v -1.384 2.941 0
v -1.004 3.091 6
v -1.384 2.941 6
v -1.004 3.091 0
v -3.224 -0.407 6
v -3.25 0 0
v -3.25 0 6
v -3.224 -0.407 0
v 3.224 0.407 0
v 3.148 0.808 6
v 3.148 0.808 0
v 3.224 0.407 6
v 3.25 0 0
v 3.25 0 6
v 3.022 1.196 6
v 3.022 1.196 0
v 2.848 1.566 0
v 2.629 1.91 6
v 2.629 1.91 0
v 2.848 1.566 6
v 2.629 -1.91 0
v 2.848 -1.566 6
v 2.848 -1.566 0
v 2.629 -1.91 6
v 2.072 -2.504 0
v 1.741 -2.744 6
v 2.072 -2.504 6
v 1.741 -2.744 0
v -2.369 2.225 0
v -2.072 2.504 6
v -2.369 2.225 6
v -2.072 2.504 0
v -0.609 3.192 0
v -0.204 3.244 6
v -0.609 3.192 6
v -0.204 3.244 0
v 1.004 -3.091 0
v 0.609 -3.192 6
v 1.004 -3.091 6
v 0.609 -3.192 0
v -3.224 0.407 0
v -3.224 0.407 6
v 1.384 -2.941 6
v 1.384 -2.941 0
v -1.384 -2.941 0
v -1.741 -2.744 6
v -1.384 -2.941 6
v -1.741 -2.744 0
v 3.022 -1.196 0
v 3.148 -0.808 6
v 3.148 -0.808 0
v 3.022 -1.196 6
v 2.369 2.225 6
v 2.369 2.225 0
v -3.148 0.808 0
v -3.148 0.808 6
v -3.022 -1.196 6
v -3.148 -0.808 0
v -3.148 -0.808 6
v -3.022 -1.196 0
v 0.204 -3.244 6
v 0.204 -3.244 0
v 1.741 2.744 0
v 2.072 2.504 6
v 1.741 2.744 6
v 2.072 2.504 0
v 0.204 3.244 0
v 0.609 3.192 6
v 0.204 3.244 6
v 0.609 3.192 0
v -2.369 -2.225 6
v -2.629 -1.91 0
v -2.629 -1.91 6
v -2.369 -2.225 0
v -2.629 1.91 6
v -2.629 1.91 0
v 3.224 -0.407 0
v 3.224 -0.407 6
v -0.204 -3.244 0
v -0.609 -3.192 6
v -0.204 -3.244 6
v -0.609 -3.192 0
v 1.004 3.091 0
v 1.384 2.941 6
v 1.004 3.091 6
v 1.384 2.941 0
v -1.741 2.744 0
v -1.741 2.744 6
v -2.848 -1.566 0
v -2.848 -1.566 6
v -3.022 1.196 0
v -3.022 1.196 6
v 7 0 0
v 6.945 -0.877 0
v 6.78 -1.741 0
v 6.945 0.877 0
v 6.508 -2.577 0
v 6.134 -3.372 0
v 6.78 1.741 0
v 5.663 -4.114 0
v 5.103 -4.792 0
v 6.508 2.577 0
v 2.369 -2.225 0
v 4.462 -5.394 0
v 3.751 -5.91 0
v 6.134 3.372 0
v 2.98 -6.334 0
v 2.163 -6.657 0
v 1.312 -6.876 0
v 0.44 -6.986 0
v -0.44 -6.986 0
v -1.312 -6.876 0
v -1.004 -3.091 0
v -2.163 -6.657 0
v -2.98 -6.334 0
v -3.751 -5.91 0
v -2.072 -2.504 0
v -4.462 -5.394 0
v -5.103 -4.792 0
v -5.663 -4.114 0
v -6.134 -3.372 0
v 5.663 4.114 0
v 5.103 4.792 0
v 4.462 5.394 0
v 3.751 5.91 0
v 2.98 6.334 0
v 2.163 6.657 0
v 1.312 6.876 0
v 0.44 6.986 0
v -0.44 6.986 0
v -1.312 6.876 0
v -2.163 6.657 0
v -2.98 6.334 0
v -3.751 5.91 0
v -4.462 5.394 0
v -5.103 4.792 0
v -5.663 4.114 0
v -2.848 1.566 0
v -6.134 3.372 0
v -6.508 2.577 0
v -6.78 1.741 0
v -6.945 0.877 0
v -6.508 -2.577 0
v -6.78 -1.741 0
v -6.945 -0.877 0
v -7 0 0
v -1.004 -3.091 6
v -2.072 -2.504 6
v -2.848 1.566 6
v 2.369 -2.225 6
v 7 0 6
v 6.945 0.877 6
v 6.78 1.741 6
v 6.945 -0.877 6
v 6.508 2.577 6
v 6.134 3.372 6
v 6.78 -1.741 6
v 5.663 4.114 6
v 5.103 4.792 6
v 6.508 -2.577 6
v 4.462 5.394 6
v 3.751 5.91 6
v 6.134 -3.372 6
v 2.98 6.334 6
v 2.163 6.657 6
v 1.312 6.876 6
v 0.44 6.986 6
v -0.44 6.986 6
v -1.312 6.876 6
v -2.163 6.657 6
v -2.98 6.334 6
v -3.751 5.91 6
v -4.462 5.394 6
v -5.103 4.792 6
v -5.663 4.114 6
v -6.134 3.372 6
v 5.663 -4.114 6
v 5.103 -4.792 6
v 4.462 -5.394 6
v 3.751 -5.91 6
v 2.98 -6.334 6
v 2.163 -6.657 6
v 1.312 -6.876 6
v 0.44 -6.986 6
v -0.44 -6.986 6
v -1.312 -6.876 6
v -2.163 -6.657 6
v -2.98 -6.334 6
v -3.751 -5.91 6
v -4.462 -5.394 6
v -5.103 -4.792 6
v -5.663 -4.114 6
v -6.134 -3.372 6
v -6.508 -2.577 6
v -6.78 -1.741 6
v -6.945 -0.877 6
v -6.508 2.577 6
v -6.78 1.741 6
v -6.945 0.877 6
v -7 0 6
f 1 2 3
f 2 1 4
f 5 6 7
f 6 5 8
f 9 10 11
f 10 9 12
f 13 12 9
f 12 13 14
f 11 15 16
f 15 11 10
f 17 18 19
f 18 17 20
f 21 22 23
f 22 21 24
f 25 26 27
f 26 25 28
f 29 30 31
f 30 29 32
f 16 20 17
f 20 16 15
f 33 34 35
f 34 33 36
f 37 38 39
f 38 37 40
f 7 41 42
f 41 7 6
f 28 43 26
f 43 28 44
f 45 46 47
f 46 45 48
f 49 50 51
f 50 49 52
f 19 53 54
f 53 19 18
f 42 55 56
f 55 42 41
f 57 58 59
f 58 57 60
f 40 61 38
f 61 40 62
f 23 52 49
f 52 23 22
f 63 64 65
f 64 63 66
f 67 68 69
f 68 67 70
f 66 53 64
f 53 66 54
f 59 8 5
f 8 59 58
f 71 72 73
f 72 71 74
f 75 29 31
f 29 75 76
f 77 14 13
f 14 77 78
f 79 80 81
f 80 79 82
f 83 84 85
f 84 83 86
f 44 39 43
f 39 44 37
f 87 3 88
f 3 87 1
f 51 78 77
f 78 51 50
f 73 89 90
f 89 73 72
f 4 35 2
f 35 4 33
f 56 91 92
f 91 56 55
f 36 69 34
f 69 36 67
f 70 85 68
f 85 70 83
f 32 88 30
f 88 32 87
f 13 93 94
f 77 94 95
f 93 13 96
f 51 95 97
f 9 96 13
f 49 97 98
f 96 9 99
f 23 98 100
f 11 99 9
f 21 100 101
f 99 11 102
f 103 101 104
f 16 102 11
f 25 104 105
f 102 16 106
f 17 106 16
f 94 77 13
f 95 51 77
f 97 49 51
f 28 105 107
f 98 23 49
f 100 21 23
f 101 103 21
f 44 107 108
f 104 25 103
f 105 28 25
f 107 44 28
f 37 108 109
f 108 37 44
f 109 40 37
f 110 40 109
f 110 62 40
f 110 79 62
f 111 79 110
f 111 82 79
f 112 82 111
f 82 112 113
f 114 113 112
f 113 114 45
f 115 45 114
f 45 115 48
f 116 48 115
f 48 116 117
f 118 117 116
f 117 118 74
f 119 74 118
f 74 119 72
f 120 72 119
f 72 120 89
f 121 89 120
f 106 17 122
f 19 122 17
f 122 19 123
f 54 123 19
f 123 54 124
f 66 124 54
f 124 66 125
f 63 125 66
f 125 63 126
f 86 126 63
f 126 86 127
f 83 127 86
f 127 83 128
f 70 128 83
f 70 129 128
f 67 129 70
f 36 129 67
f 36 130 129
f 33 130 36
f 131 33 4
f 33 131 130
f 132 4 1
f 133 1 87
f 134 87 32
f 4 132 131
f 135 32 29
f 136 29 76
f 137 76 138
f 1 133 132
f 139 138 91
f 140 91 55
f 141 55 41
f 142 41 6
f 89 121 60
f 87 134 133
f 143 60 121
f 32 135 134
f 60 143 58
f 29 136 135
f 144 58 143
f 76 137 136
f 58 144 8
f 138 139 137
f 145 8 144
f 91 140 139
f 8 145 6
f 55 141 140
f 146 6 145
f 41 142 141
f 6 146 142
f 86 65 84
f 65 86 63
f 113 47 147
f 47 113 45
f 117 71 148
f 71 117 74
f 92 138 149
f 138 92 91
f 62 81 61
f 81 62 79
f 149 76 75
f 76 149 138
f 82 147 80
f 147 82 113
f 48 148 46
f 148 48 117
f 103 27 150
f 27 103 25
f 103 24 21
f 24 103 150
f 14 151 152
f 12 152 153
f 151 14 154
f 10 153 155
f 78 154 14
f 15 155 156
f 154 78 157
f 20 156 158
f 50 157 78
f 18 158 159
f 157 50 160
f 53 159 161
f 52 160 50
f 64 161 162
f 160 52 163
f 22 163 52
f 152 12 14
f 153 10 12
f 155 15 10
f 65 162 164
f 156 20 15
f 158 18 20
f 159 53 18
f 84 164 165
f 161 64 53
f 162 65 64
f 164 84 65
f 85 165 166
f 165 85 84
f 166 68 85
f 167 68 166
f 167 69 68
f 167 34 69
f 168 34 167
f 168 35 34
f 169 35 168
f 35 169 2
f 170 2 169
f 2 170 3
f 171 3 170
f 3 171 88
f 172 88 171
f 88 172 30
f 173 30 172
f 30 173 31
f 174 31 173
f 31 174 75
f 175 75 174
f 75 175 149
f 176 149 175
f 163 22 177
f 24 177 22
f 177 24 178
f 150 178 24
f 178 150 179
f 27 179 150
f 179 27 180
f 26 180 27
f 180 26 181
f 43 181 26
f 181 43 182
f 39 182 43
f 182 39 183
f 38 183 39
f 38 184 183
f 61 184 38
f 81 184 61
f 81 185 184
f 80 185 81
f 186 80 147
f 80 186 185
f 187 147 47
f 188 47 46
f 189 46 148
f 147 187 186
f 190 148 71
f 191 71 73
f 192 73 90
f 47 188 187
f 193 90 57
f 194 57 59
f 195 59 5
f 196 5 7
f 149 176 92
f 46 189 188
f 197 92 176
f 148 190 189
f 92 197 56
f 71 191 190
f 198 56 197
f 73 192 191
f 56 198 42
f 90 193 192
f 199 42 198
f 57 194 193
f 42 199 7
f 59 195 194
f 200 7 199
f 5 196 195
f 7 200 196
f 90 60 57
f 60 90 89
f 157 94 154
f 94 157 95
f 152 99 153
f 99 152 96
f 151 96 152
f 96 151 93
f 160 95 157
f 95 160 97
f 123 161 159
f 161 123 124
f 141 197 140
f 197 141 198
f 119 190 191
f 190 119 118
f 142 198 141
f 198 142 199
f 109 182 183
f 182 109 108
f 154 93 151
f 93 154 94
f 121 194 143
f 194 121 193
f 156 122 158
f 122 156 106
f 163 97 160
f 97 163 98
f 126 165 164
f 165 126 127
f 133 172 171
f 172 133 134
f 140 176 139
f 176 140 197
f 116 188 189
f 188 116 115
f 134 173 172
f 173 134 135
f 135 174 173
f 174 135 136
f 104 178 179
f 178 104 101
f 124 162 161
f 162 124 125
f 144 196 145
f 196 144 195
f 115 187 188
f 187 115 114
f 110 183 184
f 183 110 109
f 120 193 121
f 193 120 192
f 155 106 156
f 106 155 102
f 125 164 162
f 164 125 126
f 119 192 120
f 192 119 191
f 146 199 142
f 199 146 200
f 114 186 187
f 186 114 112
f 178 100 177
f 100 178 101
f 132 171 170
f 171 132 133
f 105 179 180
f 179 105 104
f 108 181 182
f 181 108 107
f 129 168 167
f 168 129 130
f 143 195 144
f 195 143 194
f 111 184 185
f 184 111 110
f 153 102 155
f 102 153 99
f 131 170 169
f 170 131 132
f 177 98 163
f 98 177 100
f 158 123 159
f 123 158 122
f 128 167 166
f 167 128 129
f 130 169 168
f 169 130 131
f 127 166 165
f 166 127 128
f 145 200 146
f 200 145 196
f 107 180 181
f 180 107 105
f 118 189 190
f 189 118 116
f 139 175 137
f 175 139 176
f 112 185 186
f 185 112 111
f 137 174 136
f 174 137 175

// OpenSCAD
$fn = 50;


difference() {
	union() {
		cylinder(h = 6, r = 7.0000000000);
	}
	union() {
		cylinder(h = 6, r = 3.2500000000);
		cylinder(h = 6, r = 1.8000000000);
		cylinder(h = 6, r = 1.8000000000);
		cylinder(h = 6, r = 1.8000000000);
	}
}
